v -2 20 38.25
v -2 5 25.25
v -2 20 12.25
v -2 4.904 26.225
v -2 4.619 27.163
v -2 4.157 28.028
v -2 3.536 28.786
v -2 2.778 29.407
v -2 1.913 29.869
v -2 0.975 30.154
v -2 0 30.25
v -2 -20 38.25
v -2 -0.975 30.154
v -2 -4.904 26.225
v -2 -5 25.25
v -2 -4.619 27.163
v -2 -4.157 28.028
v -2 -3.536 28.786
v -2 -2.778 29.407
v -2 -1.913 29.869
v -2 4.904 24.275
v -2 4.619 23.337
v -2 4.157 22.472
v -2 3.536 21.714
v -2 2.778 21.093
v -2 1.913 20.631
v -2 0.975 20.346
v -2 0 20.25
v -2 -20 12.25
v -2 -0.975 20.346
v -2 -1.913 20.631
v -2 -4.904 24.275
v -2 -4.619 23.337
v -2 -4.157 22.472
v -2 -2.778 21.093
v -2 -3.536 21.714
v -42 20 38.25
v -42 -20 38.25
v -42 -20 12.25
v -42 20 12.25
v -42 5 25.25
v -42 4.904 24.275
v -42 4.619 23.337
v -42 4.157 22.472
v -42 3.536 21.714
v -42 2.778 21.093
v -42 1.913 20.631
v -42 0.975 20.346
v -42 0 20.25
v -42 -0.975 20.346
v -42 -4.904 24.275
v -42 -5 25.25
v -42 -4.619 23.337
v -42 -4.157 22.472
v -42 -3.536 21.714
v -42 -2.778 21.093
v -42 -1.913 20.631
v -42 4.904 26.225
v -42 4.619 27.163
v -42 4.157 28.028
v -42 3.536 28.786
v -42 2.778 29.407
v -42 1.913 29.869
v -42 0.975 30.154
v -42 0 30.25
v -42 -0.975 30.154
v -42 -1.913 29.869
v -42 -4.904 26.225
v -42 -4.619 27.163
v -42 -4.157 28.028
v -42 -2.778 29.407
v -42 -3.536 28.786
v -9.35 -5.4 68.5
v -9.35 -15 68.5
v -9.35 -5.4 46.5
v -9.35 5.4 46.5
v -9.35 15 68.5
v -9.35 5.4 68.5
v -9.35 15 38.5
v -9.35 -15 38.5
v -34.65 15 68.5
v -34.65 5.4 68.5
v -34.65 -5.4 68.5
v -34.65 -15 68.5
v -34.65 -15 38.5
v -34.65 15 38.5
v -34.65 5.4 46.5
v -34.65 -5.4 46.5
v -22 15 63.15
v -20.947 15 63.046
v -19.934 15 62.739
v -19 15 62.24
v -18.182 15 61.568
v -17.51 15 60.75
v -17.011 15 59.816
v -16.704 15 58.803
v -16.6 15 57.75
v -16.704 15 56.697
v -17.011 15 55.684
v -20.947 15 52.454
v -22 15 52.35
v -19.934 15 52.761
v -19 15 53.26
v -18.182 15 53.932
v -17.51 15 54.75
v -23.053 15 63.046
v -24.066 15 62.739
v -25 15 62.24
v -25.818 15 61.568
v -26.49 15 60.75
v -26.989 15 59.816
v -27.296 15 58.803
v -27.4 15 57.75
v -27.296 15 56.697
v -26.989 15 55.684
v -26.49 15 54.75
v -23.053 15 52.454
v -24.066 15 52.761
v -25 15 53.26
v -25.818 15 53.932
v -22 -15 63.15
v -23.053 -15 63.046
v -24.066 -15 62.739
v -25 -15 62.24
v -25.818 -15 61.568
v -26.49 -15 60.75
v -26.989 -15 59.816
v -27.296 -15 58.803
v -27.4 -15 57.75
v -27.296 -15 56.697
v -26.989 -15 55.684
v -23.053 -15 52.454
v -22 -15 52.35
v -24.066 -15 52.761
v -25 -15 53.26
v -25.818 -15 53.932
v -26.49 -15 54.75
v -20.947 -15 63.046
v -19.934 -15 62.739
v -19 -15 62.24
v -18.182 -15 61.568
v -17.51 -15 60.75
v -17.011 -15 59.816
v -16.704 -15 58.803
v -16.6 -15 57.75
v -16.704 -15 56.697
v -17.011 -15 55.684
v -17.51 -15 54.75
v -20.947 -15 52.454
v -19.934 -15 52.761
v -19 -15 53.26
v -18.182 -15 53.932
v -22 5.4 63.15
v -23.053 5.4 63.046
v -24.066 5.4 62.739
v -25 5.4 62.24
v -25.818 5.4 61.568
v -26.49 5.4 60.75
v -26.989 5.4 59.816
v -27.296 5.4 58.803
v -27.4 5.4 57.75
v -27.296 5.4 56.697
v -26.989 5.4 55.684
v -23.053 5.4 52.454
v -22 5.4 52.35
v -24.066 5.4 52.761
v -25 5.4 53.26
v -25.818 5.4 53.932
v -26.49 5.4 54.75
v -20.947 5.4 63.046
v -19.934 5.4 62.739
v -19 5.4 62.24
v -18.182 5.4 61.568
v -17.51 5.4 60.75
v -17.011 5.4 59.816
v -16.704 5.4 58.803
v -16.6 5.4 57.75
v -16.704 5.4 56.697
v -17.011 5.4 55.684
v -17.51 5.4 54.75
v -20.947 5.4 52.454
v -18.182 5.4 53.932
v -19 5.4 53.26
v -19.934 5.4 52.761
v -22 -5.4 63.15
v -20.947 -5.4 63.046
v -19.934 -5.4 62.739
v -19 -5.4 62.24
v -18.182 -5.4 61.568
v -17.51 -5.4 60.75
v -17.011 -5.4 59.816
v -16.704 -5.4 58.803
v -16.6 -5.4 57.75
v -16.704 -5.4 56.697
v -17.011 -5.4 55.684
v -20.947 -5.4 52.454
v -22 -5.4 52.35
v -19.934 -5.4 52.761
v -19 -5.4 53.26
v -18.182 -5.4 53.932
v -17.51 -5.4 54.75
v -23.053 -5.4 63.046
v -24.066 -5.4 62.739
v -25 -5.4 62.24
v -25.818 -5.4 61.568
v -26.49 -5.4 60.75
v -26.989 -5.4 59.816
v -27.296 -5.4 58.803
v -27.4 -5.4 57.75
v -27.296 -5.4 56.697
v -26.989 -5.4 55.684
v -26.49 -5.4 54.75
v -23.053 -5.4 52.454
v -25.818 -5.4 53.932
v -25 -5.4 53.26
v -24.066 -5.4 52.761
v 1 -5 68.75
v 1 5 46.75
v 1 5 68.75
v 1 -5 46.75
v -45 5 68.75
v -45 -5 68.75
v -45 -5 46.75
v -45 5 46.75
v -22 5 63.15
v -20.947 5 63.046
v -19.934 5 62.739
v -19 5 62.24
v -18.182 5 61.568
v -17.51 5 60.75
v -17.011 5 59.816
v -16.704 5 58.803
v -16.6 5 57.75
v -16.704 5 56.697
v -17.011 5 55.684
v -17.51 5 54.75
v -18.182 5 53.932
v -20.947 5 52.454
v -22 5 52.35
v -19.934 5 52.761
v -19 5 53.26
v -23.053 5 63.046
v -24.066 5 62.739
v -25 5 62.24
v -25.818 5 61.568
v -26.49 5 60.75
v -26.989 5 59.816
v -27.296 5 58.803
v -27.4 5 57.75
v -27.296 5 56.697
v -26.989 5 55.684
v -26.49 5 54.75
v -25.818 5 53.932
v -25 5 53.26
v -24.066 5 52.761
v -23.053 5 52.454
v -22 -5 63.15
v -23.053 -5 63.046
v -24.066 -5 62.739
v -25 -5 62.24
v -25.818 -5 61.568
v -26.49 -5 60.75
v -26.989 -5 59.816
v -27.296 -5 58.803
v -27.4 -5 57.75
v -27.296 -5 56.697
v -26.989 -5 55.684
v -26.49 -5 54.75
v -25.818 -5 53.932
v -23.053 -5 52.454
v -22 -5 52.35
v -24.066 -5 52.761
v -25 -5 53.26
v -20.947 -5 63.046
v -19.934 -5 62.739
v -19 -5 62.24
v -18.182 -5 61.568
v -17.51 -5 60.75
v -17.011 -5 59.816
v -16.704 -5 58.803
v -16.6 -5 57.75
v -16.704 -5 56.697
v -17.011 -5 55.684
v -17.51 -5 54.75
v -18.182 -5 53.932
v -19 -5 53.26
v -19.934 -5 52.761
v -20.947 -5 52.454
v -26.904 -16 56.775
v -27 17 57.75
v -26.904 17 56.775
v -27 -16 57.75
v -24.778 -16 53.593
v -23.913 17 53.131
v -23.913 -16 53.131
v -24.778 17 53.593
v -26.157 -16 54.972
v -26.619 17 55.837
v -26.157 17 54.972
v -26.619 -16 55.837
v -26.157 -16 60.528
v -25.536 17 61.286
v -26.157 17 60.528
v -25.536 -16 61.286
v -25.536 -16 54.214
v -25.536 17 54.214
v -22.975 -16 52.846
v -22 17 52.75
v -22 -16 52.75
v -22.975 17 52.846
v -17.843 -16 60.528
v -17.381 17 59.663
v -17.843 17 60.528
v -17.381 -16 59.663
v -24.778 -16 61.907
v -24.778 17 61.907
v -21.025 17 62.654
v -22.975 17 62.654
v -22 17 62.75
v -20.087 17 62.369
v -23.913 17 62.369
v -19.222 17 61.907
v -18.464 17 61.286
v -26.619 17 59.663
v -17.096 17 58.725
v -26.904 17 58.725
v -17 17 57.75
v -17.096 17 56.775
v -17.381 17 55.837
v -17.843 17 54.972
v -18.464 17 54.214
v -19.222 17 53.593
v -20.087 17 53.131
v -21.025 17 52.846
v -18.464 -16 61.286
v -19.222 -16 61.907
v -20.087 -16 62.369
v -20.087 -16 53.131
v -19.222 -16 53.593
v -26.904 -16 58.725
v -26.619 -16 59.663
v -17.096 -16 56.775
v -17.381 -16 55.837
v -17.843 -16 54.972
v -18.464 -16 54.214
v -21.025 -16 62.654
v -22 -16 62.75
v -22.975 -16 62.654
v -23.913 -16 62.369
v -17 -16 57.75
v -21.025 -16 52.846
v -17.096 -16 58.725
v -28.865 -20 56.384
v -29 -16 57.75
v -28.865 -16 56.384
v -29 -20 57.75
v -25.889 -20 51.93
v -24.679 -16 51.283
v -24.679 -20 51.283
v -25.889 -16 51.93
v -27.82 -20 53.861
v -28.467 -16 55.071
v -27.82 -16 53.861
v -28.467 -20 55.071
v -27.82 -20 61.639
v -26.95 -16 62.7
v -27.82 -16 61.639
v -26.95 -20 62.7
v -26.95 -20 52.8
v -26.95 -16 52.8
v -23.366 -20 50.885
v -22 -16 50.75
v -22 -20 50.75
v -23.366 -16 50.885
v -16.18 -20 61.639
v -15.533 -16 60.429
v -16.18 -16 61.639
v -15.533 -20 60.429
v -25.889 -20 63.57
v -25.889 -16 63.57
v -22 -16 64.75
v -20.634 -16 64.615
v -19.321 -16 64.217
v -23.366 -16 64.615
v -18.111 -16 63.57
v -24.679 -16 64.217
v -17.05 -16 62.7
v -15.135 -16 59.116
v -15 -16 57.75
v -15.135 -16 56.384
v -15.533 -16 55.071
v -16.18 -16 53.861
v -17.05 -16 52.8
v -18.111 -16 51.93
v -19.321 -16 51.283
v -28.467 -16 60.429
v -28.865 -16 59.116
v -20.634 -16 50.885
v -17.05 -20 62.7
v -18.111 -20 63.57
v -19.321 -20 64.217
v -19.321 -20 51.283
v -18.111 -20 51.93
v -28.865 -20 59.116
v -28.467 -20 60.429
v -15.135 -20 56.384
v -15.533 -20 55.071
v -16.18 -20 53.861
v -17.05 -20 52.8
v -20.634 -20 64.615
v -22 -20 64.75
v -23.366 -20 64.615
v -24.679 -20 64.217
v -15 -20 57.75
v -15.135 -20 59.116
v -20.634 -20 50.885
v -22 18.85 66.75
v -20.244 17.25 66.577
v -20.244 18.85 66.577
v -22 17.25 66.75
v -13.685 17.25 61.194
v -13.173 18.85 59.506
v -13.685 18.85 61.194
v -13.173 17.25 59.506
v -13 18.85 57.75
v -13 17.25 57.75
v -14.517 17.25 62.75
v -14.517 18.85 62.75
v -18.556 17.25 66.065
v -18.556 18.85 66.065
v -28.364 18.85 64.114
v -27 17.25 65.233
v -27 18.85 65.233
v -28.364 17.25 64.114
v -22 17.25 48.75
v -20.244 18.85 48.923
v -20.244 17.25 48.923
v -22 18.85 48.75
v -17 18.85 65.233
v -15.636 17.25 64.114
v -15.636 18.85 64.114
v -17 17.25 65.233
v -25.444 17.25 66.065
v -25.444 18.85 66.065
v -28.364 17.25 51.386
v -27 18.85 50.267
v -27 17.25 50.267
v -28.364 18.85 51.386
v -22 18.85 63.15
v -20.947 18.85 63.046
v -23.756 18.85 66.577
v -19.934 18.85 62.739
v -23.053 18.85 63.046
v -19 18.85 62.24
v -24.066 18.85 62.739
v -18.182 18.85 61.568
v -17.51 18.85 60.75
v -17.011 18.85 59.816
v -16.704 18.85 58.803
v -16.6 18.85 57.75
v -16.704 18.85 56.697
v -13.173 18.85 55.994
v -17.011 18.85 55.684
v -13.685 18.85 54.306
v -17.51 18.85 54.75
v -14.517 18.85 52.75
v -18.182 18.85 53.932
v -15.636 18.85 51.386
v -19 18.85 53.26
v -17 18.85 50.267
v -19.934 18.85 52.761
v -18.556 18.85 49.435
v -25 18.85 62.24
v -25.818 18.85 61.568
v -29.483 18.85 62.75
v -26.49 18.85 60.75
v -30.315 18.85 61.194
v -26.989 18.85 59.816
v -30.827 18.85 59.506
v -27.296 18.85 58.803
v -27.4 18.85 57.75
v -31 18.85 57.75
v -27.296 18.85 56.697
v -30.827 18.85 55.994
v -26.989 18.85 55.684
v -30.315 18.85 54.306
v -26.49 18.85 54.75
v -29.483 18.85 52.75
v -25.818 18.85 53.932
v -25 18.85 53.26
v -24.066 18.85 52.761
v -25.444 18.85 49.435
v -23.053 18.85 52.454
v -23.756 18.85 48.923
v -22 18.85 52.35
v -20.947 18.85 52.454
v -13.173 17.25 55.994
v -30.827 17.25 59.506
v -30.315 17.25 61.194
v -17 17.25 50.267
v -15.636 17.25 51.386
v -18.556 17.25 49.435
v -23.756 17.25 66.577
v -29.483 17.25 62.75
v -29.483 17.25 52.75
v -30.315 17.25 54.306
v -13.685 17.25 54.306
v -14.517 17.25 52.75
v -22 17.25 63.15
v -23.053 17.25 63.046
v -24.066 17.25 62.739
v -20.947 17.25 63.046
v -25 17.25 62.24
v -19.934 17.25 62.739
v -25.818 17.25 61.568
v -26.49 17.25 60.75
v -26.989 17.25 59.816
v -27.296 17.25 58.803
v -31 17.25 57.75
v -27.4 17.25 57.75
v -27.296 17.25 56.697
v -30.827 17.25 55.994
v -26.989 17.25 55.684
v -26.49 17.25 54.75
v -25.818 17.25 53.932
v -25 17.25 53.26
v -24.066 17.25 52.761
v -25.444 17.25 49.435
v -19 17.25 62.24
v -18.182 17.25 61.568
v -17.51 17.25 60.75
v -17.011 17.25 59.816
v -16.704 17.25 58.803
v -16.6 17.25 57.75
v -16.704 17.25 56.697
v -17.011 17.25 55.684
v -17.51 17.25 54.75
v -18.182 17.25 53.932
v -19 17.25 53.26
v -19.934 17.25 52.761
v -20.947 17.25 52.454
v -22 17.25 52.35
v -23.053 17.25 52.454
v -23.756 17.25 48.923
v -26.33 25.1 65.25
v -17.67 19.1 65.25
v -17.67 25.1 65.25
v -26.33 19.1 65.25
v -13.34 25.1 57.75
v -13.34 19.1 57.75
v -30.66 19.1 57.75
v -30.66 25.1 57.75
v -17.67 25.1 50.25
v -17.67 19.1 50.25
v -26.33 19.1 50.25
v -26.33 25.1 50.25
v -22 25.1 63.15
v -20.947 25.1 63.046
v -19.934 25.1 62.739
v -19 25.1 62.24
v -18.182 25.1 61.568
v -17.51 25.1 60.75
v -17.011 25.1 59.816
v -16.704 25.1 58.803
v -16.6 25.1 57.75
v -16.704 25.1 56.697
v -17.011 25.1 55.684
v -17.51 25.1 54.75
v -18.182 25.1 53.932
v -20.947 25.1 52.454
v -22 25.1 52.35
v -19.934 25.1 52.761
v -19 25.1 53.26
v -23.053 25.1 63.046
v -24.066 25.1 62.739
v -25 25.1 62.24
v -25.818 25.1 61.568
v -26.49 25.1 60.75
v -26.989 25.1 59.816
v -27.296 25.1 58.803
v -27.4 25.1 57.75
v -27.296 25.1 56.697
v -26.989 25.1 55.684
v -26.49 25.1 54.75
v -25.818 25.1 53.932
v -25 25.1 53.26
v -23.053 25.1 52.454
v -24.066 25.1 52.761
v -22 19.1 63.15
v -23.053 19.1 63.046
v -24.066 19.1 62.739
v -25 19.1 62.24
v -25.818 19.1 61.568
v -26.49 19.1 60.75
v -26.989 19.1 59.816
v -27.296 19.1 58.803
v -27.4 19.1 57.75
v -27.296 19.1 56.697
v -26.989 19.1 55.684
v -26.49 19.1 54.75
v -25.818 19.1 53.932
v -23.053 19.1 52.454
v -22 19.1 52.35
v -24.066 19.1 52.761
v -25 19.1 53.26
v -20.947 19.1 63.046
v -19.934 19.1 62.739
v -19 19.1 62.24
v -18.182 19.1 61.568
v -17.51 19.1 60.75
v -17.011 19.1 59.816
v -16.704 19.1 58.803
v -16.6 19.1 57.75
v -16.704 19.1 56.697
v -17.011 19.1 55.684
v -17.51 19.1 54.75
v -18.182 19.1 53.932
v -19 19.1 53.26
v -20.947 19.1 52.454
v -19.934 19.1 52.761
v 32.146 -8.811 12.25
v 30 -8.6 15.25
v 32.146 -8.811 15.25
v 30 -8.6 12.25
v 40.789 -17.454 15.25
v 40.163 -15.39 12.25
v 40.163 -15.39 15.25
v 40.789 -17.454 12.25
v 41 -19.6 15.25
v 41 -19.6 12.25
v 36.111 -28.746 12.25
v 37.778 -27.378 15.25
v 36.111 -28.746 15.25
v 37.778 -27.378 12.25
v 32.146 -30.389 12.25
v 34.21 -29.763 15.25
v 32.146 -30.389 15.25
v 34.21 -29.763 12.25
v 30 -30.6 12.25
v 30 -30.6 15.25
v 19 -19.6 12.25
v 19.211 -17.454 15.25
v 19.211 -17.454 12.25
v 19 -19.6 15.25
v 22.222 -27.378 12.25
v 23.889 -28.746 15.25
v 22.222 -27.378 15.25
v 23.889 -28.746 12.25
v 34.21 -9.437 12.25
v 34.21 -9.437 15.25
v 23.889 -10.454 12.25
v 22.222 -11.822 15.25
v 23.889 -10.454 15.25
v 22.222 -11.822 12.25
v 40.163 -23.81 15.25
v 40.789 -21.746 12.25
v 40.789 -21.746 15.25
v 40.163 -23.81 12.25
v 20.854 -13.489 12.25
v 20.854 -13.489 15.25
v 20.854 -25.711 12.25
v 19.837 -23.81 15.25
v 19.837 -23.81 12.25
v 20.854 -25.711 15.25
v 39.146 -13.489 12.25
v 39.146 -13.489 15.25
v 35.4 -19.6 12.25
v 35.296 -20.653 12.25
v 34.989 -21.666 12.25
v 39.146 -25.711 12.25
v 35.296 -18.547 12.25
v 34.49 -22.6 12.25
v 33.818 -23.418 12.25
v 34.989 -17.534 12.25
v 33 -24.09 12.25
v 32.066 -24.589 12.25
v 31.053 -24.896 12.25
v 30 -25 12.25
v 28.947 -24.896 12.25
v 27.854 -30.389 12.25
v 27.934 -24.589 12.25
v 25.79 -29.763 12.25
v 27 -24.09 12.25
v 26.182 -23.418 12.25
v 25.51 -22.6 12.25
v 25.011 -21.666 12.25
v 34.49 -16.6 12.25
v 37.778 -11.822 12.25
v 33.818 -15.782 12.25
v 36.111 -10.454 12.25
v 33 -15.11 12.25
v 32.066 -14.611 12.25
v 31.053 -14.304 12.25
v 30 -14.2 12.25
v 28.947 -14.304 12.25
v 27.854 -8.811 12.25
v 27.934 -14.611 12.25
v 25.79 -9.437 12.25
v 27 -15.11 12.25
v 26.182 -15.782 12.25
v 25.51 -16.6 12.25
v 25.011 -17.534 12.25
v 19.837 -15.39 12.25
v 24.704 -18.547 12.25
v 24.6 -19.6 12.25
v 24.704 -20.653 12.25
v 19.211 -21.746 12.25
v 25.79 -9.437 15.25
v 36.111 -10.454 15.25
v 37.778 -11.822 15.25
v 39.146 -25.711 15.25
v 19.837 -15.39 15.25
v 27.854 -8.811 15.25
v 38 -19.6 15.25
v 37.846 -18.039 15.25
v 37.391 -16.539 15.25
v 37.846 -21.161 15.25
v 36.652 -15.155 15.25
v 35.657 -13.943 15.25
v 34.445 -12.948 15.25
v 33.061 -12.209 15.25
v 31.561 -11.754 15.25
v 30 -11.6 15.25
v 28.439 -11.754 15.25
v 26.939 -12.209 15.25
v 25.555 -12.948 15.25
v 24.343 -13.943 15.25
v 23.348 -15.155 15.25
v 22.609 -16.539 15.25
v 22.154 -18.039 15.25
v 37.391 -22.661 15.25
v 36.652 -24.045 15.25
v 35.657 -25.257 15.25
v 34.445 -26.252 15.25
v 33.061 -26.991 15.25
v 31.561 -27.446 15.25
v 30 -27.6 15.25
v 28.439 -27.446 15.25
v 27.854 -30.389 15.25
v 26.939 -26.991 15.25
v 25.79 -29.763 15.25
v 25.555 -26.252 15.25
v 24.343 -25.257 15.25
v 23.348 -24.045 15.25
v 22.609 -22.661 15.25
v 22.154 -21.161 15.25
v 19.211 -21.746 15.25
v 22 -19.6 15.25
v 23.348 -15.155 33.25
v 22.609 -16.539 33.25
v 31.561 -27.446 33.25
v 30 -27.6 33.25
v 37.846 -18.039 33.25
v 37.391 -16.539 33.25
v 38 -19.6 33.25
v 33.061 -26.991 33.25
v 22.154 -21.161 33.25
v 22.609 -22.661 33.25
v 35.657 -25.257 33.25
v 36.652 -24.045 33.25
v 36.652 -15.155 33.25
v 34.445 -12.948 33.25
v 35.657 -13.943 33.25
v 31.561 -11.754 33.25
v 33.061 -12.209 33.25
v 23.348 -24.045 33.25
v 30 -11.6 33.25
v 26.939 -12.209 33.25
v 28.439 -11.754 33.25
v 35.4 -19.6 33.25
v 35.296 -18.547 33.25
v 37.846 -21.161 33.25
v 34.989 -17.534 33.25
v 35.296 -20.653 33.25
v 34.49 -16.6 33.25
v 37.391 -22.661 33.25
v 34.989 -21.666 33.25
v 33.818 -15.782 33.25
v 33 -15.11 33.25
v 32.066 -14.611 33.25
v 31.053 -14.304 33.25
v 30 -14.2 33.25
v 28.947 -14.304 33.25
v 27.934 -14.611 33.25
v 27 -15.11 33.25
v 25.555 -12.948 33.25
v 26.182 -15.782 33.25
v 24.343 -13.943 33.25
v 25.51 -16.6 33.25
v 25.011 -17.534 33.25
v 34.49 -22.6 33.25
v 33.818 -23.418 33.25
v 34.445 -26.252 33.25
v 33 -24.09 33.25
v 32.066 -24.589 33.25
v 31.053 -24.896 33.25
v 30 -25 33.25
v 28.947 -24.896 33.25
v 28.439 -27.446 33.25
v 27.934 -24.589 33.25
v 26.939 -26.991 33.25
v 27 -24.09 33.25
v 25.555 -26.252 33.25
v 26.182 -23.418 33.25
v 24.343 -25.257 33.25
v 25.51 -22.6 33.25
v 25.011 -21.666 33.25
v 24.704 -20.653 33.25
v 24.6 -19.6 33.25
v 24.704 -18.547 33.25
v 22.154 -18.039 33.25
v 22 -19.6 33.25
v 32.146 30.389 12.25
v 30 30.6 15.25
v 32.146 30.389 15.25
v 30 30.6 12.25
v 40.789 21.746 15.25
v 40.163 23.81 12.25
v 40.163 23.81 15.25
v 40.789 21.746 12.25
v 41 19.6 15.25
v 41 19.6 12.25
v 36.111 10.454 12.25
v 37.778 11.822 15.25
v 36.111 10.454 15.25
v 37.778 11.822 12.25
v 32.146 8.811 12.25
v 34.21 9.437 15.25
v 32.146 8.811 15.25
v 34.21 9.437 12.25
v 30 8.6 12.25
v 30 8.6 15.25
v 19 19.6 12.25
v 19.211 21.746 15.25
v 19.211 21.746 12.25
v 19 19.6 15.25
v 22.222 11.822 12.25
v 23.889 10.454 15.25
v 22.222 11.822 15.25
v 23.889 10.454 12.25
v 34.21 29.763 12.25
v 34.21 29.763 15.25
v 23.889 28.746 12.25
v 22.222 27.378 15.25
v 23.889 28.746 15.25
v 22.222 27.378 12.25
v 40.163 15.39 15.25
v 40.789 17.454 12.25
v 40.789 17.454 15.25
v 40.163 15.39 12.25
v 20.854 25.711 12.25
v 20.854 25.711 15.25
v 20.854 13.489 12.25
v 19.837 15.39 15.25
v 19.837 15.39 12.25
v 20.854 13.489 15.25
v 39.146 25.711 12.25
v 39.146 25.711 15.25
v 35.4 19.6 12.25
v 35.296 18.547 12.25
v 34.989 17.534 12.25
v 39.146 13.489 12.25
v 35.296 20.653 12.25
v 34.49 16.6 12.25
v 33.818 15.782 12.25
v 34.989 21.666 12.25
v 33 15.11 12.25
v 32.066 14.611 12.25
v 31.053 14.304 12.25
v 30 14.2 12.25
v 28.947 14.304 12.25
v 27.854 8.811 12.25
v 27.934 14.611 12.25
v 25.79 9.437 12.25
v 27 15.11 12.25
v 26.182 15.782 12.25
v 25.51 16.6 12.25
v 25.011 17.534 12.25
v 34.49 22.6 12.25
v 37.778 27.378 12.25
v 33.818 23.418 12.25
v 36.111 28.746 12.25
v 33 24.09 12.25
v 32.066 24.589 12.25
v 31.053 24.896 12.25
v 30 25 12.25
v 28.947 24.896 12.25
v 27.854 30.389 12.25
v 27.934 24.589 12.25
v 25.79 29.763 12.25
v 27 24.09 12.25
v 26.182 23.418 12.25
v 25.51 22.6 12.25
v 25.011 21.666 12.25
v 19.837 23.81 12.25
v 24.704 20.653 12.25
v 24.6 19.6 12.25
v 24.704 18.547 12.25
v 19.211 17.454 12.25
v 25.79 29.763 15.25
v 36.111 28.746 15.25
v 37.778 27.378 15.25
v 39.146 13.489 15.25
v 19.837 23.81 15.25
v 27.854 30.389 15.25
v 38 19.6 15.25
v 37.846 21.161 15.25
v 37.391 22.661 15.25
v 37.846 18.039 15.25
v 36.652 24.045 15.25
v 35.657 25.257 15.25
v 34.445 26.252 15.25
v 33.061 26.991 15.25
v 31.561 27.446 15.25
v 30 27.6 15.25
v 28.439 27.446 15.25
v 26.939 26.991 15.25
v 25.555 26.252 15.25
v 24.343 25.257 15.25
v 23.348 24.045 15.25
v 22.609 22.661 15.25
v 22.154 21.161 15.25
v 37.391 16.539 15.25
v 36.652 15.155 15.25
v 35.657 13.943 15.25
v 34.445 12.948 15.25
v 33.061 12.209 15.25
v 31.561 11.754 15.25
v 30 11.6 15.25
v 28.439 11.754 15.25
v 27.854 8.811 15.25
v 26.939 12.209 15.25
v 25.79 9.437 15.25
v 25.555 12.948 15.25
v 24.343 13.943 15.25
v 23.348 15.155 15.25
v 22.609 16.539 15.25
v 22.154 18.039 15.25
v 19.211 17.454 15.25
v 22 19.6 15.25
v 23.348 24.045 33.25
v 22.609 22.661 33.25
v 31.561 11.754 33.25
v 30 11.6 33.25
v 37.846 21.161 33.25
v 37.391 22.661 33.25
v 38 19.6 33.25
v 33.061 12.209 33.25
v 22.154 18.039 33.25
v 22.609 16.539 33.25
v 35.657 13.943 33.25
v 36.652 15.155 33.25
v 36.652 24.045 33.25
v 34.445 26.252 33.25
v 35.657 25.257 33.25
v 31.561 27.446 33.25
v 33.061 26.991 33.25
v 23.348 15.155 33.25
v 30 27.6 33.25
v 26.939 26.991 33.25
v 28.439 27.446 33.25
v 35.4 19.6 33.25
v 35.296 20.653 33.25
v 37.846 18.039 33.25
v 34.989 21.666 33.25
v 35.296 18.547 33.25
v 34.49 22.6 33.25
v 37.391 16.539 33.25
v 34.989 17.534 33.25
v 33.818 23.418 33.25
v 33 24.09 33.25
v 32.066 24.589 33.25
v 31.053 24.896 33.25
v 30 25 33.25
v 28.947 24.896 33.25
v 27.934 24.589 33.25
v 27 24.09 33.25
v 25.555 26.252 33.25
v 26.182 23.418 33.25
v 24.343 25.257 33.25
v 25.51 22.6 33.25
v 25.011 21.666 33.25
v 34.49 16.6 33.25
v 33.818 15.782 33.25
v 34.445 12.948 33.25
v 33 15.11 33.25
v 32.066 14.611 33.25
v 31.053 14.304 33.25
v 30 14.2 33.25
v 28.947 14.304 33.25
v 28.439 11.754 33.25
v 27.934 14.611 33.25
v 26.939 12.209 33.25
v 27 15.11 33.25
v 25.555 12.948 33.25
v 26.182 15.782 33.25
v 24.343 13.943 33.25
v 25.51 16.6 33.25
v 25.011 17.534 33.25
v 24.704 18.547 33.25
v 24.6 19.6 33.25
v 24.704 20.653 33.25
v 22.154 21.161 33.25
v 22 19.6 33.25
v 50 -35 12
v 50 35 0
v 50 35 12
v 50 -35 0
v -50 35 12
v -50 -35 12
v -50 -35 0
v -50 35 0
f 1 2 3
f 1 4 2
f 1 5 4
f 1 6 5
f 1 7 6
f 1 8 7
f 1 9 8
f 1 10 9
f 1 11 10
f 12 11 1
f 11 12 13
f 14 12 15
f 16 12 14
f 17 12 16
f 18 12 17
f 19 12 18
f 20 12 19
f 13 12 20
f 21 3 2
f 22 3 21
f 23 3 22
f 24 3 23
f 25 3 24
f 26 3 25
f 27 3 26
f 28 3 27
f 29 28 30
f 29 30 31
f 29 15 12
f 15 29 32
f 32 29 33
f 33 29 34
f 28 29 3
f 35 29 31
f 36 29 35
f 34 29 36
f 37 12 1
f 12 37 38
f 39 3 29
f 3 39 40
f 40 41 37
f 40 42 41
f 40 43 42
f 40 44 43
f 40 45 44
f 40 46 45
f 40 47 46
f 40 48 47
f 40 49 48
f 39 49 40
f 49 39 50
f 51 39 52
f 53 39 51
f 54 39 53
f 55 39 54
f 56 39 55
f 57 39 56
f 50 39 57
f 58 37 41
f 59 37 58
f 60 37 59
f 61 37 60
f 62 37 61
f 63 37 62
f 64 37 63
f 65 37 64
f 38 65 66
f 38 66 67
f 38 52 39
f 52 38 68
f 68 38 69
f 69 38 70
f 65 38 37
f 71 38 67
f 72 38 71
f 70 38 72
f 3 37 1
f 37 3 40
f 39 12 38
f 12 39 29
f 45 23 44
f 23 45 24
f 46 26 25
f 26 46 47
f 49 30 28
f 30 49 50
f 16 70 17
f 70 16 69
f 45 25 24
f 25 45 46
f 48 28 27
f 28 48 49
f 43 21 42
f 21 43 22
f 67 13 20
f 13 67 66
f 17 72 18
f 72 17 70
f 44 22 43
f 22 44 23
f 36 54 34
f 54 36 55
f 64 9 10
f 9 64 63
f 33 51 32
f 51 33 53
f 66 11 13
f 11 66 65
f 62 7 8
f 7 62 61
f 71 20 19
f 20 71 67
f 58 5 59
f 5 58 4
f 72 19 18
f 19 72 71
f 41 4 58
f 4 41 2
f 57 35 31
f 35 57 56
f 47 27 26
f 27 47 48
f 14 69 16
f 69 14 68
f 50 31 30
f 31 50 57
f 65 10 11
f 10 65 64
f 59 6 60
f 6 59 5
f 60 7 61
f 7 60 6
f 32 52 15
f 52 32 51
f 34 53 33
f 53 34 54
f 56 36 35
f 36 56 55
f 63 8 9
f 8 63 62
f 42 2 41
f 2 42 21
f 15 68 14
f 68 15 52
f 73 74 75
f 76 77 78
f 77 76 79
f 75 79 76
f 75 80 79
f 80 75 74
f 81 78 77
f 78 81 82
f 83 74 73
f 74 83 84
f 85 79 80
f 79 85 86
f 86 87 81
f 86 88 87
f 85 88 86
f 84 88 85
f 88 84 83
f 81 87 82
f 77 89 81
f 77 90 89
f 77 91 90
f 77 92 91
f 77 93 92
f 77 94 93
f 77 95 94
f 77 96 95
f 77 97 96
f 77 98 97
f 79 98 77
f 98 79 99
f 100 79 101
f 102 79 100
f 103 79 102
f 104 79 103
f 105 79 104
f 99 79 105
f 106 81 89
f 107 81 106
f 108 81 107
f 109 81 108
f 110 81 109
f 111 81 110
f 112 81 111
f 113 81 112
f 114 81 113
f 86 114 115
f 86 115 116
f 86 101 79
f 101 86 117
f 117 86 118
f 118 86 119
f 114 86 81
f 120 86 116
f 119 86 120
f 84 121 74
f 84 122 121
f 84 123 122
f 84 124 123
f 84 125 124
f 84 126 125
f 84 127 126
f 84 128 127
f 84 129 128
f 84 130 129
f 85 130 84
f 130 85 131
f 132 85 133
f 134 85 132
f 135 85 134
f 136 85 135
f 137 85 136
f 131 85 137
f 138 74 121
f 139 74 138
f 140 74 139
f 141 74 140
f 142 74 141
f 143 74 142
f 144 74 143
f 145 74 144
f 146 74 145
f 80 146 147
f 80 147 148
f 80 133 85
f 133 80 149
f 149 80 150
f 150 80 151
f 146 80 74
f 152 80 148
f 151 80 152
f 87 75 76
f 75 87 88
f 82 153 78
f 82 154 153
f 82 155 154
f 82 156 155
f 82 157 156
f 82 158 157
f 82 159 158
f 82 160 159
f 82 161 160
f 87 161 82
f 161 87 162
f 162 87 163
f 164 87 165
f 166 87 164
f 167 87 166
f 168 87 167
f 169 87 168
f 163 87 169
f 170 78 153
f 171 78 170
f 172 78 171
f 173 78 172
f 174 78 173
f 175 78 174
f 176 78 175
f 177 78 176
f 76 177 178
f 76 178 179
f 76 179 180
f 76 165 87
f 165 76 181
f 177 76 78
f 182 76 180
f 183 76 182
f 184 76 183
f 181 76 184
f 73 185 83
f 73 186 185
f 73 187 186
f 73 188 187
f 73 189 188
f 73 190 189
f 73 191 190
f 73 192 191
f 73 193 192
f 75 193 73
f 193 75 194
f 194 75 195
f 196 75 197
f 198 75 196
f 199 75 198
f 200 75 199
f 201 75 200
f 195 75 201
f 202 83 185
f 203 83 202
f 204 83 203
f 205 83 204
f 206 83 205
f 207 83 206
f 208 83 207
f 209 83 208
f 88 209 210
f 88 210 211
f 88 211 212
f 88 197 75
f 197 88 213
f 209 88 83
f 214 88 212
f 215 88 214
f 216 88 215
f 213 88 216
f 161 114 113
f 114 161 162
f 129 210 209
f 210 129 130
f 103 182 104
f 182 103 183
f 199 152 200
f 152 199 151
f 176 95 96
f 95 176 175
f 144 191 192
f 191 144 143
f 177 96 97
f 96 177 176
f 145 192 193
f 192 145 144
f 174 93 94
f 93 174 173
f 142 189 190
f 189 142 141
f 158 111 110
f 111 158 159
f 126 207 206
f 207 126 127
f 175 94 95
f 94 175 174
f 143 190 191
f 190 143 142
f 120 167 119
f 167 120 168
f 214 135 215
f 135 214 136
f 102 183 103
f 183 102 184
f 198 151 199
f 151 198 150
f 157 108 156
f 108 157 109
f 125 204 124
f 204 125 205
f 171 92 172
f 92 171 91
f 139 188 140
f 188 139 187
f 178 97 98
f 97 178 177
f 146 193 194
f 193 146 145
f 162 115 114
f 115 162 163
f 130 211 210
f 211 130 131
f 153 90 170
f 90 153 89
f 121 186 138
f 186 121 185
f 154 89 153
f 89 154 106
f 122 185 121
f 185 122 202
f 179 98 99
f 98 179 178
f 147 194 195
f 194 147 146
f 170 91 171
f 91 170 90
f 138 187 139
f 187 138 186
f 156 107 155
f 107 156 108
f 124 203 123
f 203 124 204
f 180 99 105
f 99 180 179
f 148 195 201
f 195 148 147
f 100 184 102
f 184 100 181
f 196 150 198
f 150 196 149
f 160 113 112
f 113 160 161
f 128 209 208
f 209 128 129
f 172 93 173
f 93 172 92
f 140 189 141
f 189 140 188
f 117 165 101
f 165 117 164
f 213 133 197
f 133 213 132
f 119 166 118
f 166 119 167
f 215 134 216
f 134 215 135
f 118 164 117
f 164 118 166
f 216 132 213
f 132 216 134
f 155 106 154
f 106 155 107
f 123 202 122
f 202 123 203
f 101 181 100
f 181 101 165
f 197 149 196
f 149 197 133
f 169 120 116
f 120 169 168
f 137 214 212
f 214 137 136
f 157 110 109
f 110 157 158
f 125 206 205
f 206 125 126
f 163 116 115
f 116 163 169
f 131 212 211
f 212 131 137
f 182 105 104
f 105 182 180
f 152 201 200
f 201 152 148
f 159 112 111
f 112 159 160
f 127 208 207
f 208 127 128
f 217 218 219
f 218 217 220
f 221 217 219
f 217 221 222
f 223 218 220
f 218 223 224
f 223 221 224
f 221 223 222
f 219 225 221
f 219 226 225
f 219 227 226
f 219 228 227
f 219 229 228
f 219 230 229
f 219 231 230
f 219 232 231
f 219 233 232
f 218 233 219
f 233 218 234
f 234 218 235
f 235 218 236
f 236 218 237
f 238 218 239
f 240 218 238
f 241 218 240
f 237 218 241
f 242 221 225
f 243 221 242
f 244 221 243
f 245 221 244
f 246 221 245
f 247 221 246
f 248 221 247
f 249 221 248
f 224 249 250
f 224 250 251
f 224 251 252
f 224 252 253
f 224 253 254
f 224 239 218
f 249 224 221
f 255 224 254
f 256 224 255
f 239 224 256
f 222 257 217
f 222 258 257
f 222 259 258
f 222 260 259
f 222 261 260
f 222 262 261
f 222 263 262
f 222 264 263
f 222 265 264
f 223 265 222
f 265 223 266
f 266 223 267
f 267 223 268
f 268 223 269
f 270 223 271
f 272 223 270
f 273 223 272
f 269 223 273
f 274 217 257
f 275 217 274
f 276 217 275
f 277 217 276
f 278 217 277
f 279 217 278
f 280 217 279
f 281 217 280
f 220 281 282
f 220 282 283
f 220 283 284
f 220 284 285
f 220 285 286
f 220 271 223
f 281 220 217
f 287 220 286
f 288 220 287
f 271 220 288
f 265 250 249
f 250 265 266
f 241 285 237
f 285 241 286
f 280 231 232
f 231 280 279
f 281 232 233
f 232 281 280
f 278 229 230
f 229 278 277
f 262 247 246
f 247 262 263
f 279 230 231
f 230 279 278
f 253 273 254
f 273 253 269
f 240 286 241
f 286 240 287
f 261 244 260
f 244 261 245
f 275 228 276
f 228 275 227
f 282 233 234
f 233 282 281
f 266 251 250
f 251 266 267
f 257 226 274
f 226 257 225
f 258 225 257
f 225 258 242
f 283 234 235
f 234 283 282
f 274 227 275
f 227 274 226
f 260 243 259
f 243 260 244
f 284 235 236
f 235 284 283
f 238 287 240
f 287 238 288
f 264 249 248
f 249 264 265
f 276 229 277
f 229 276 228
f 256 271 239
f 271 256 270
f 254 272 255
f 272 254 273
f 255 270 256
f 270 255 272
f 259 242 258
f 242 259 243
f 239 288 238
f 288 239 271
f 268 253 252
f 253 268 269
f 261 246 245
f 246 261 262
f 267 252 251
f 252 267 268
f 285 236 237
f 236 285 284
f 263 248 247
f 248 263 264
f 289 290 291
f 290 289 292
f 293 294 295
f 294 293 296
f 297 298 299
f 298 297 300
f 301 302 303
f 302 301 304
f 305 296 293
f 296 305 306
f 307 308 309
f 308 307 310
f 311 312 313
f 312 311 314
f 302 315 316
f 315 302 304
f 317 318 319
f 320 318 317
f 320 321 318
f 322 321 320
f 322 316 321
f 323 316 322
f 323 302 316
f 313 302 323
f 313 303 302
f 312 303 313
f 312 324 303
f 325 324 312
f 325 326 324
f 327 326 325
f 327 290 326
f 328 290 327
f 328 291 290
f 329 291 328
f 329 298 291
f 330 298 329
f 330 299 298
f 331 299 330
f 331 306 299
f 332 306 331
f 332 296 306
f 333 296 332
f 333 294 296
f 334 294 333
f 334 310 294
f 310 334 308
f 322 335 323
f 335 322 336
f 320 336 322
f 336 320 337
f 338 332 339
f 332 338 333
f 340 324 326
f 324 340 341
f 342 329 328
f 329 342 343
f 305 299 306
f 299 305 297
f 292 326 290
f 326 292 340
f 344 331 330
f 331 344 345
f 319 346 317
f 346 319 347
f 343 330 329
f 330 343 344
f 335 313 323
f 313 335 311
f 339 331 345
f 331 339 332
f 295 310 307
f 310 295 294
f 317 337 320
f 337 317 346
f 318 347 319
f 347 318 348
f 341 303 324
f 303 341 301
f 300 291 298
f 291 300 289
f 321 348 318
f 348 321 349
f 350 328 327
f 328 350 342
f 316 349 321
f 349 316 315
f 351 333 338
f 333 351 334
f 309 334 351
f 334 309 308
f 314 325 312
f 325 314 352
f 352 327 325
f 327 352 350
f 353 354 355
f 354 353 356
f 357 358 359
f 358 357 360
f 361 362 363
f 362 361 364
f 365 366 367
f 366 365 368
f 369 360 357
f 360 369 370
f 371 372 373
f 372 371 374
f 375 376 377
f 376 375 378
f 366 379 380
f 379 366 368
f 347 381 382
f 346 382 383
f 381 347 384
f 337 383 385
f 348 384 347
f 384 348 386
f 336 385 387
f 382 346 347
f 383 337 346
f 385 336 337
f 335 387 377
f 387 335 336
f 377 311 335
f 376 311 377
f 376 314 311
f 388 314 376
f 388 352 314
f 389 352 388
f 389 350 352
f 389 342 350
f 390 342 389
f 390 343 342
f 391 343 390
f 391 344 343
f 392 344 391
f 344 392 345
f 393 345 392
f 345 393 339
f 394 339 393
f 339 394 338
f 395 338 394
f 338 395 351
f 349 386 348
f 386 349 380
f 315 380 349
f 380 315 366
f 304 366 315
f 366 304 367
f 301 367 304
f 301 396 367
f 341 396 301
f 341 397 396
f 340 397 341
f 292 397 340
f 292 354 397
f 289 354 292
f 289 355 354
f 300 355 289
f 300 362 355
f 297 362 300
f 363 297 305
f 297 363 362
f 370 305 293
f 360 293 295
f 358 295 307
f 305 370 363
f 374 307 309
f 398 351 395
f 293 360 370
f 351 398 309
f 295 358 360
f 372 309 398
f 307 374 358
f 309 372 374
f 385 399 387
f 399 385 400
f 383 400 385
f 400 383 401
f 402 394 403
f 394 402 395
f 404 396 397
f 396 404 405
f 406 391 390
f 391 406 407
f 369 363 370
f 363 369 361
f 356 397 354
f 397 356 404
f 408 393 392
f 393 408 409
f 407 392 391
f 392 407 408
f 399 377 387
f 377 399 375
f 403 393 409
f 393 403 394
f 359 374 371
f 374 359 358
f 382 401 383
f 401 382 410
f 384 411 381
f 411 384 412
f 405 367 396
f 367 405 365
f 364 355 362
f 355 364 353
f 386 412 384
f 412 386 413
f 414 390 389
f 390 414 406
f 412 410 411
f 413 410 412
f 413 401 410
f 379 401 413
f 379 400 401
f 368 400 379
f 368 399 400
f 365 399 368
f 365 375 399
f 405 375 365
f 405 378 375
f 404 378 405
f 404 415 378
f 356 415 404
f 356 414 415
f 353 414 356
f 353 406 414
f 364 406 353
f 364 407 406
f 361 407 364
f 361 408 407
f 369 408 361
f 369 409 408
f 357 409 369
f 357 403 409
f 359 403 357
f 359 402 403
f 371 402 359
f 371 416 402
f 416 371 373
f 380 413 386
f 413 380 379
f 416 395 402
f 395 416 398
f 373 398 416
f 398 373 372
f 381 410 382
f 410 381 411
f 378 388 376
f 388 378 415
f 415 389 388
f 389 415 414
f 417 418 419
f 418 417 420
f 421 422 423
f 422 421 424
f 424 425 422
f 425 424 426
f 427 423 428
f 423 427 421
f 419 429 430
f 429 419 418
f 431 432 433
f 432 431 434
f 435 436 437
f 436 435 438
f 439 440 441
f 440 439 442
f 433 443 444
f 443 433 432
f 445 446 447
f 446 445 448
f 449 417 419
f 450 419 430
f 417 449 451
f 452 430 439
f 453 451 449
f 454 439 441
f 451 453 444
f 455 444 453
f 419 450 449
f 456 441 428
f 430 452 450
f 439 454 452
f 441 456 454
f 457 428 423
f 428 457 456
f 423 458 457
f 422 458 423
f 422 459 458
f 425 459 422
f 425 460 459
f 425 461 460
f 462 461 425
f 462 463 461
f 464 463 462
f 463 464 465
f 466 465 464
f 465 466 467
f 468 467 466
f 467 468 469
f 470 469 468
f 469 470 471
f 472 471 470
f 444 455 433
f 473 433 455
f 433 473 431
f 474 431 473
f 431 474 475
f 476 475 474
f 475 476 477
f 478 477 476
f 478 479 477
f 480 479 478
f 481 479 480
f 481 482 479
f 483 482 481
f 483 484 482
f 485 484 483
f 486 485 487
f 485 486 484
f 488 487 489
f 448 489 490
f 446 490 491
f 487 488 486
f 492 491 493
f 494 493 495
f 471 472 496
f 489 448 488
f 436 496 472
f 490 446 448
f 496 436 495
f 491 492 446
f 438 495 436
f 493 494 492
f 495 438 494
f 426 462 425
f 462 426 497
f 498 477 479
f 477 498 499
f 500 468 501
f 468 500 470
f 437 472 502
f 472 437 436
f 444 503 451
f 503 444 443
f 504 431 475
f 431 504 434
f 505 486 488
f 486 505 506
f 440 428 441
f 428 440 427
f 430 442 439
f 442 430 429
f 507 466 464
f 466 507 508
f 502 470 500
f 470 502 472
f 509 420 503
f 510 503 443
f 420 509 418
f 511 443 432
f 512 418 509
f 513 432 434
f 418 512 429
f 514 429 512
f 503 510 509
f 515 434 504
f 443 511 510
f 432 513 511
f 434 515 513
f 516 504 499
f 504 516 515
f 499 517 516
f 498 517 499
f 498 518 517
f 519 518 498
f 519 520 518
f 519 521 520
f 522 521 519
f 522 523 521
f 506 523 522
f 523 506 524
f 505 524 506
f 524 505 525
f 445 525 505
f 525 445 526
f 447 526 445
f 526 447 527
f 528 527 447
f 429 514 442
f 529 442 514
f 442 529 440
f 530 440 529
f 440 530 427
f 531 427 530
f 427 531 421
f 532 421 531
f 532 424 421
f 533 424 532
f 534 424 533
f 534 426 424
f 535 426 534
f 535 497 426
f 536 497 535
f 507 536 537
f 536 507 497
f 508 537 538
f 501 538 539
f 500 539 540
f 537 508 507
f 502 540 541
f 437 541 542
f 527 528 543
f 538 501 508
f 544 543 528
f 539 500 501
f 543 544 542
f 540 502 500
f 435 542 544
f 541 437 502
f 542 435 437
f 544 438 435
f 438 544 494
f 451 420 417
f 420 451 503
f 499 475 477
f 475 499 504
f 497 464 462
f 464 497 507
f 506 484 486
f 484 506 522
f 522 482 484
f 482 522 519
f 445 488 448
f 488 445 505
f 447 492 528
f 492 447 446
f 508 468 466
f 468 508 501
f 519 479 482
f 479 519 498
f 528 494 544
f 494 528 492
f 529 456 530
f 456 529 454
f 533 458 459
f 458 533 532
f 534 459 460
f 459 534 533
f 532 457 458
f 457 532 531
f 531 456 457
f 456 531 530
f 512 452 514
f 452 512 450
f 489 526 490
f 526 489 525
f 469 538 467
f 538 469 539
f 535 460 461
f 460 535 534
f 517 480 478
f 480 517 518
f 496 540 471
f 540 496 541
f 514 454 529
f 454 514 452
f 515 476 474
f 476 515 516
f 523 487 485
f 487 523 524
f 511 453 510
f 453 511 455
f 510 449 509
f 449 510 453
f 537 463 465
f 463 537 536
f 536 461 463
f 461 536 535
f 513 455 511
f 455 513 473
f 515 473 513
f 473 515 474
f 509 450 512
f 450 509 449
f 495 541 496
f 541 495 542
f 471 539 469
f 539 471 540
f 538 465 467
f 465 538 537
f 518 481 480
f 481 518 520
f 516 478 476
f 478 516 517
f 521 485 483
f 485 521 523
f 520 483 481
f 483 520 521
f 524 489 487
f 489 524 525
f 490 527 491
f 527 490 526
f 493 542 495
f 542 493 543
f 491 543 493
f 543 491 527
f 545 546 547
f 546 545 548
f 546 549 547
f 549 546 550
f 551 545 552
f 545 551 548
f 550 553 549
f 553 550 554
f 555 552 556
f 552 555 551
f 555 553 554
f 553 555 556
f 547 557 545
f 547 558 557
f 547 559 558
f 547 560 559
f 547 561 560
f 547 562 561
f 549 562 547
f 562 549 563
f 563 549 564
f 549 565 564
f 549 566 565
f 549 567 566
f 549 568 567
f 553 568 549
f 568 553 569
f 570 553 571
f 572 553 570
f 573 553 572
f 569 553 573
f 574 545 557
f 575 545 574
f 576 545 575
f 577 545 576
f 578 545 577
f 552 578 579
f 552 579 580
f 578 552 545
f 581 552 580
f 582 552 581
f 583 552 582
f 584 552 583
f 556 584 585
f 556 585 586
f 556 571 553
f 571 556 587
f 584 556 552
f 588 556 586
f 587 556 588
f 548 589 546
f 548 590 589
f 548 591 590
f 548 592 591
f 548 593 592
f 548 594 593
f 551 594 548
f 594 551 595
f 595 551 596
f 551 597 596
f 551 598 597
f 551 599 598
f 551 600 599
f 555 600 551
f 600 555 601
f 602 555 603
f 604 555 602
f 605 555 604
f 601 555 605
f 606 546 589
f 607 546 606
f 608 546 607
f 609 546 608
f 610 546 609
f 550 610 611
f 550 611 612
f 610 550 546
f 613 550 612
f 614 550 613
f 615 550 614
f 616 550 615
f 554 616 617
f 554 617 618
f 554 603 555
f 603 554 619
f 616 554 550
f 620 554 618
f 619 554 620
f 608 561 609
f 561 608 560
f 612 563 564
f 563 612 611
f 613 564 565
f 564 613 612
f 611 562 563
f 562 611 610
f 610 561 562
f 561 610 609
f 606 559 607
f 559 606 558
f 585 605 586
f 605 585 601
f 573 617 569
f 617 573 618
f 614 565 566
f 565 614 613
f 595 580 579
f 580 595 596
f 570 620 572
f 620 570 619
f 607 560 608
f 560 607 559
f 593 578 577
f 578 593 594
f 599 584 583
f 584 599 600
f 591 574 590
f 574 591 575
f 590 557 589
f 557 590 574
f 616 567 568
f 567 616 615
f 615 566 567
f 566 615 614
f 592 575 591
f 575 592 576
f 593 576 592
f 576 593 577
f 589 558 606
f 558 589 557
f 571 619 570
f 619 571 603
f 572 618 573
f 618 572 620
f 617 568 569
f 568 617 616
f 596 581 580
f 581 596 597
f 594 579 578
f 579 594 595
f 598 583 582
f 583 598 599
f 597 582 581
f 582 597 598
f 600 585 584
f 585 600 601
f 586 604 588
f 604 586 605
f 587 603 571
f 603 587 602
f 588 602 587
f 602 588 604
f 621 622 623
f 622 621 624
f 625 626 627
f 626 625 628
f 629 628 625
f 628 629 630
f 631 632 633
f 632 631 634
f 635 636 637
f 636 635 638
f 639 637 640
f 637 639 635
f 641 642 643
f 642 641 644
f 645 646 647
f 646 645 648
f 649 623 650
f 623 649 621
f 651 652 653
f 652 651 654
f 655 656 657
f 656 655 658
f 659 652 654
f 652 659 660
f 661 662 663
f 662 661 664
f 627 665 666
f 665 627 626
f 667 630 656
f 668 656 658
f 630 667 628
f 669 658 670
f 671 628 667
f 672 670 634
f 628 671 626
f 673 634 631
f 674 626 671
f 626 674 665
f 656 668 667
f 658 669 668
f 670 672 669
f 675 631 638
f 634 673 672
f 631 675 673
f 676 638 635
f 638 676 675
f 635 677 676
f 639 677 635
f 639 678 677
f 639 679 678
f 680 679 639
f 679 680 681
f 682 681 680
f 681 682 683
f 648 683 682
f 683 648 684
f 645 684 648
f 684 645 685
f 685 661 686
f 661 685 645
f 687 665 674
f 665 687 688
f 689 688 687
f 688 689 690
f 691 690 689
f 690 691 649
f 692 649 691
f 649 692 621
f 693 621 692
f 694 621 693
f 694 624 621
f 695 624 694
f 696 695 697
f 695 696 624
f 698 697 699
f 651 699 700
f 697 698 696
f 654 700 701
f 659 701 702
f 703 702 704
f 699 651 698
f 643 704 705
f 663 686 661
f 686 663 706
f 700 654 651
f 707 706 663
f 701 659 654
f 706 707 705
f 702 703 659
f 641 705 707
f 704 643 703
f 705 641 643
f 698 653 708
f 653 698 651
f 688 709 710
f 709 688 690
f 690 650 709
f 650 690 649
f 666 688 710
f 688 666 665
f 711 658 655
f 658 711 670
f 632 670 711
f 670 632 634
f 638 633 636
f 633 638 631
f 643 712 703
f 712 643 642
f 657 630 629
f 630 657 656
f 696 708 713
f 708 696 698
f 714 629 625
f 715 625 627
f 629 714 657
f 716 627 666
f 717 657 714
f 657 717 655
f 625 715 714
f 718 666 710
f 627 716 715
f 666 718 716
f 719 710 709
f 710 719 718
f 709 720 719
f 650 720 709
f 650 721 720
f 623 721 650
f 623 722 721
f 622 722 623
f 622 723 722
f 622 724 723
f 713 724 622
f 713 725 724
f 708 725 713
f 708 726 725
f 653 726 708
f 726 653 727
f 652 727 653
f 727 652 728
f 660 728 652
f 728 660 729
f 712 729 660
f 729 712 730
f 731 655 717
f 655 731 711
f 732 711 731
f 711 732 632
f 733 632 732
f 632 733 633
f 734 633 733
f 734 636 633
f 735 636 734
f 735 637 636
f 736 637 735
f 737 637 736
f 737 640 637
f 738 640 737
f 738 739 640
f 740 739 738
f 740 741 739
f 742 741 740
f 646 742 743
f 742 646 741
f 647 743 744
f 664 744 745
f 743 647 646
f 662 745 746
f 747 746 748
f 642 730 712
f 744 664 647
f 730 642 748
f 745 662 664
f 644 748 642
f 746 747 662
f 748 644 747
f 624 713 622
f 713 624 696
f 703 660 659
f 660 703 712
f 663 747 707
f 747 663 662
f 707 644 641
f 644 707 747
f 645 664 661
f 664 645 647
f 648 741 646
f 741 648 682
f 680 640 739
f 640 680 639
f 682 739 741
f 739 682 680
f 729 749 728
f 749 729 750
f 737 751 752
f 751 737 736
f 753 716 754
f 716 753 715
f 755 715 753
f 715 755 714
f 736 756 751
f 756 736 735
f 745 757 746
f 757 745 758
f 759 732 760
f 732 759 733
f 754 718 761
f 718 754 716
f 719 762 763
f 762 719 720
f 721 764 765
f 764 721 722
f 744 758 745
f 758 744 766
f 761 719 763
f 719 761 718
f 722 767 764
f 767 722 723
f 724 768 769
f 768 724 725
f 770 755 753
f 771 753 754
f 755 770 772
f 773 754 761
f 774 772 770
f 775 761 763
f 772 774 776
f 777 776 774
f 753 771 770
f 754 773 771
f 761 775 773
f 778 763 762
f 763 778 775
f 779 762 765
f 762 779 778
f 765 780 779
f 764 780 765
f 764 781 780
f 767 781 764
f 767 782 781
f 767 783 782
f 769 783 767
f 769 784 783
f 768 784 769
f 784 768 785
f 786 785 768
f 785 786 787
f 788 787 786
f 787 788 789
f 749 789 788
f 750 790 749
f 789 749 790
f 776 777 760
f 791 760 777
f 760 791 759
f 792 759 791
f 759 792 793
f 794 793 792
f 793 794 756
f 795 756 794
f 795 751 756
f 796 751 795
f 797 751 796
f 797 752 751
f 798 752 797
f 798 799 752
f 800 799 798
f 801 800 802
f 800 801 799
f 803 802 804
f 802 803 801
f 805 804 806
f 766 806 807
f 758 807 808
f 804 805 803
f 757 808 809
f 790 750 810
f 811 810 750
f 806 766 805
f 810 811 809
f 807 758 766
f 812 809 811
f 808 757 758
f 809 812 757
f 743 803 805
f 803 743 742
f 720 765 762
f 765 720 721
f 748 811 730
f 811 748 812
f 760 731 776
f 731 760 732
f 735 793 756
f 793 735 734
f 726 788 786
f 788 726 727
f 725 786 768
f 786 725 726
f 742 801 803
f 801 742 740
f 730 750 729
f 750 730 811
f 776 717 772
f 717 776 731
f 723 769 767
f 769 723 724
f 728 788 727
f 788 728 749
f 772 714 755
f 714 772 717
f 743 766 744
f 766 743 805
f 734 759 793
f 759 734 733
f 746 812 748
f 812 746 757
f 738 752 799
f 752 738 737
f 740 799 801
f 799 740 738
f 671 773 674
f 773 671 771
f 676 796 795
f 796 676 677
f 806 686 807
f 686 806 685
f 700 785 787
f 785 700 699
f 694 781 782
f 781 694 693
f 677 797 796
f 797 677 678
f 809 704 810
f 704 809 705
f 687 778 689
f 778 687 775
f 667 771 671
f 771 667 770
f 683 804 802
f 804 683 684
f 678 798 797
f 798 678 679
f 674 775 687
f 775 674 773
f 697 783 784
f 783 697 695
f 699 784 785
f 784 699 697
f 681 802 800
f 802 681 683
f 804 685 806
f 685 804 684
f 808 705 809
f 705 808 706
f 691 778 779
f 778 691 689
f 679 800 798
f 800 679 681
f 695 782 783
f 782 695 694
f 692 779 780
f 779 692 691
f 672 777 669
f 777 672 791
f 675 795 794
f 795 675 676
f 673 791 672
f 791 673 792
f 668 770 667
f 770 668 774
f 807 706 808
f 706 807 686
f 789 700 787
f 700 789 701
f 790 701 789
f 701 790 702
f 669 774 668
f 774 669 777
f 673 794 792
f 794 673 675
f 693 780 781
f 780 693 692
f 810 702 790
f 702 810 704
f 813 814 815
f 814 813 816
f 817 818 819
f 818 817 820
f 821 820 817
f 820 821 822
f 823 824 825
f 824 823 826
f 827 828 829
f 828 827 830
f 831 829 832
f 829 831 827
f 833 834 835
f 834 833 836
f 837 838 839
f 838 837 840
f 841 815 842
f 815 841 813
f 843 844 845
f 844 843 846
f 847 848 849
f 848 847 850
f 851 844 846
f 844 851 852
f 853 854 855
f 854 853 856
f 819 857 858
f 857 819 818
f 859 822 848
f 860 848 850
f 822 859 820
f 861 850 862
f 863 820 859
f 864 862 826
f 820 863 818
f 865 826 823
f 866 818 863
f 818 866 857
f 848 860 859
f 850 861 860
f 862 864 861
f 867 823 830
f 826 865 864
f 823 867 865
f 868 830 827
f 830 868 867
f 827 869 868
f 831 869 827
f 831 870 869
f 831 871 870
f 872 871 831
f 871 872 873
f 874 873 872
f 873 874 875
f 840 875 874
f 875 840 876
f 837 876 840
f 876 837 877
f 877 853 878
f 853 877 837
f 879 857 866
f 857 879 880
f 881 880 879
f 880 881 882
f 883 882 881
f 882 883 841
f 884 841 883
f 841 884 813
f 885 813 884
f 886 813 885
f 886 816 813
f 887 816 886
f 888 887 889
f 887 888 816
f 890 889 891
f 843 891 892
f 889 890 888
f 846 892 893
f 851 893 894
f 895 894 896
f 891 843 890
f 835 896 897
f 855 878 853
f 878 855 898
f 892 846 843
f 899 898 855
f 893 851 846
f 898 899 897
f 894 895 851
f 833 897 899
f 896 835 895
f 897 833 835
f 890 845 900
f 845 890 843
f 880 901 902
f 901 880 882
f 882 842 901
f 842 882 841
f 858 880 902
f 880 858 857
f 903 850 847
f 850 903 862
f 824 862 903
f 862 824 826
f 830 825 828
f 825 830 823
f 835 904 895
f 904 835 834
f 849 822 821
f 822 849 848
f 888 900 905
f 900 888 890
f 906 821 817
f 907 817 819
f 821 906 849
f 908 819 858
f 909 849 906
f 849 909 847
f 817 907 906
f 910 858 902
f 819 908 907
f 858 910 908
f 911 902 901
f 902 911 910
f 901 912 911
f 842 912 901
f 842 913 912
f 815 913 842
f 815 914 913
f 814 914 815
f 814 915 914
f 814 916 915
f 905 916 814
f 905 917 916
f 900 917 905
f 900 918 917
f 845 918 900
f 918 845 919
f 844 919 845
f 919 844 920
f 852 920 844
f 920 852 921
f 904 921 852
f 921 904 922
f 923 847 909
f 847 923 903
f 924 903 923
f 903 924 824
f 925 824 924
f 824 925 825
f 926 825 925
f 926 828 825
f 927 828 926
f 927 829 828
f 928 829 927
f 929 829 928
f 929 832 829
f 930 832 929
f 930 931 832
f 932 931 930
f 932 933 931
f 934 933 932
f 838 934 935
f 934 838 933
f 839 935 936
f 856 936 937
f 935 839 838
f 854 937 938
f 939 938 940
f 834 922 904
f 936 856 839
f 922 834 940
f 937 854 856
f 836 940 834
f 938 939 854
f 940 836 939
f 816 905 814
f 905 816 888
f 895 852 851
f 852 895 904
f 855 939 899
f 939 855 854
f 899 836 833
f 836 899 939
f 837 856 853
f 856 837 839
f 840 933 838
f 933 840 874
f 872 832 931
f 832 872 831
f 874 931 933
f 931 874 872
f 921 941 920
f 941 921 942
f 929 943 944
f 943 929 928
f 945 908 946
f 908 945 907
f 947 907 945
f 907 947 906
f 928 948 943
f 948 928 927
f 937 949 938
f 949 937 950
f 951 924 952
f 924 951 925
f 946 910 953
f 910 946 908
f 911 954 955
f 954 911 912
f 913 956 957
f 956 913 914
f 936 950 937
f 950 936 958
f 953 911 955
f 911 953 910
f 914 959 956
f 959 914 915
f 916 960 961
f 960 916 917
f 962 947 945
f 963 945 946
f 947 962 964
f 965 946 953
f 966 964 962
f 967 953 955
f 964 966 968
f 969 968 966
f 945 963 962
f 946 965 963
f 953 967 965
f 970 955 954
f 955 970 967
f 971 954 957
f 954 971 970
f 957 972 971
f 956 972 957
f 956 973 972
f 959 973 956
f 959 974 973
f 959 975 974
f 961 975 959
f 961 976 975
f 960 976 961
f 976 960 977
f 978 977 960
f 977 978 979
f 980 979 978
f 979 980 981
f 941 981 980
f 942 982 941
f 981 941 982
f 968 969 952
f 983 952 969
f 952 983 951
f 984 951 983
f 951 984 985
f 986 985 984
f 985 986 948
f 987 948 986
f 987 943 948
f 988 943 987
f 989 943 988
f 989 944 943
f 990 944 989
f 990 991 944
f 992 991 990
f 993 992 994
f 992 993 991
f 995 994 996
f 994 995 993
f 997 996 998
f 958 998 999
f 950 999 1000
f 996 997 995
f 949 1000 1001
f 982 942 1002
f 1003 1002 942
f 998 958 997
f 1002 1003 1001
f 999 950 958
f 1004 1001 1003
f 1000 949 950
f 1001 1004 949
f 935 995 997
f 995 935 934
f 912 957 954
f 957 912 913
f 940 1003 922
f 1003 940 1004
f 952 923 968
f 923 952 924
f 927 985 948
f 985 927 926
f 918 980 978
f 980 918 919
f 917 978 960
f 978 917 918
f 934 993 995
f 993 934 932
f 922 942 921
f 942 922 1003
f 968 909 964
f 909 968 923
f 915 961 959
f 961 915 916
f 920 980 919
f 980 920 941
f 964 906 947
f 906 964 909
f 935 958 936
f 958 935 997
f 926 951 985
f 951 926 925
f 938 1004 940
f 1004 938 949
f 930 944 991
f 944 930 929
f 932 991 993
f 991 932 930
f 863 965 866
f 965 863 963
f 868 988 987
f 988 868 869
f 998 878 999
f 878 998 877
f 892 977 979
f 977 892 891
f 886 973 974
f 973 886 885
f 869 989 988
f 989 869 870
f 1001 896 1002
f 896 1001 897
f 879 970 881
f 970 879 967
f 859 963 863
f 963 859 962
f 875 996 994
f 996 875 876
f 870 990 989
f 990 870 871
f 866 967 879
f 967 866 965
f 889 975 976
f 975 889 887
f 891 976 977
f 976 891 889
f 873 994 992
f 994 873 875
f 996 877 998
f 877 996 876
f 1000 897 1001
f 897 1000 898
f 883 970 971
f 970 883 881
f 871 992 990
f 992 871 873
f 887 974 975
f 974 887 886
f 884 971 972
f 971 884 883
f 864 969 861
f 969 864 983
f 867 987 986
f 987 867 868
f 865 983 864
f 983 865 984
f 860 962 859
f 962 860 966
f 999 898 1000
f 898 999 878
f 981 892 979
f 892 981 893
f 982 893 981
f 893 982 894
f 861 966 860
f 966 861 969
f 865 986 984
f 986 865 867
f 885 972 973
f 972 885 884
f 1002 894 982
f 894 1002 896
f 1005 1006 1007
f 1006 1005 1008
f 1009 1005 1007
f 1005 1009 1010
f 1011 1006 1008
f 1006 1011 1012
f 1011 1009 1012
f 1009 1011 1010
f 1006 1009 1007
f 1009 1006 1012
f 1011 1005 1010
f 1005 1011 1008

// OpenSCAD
$fn = 32;

// ------------------------------------------------------------------------
// Indexing jig: plate 100 x 70 mm, pin d10
// Every part is its own module, assembly() places every instance.
// ------------------------------------------------------------------------

// --- part 1 ---
module jig_plate() {
  difference() {
    translate([-50, -35, 0]) cube([100, 70, 12]);
  }
}

// --- part 2 ---
module locator_block() {
  difference() {
    translate([-20, -20, 0]) cube([40, 40, 26]);
    translate([0, 0, 13]) rotate([0, 90, 0]) cylinder(h = 42, d = 10, center = true);
  }
}

// --- part 3 ---
module index_fork() {
  difference() {
    translate([-12.65, -15, 0]) cube([25.3, 30, 30]);
    translate([-13.65, -5.4, 8]) cube([27.3, 10.8, 23]);
    translate([0, 0, 19.25]) rotate([90, 0, 0]) cylinder(h = 32, d = 10.8, center = true);
  }
}

// --- part 4 ---
module index_arm() {
  difference() {
    translate([-23, -5, 0]) cube([46, 10, 22]);
    translate([0, 0, 11]) rotate([90, 0, 0]) cylinder(h = 12, d = 10.8, center = true);
  }
}

// --- part 5 ---
module index_pin() {
  rotate([0, 90, 0]) cylinder(h = 34, d = 10, center = true);
  translate([-20, 0, 0]) rotate([0, 90, 0]) cylinder(h = 4, d = 14);
}

// --- part 6 ---
module pin_washer() {
  difference() {
      translate([0, 0, 0]) cylinder(h = 1.6, d = 18);
      translate([0, 0, -1]) cylinder(h = 3.6, d = 10.8);
    }
}

// --- part 7 ---
module lock_nut() {
  difference() {
    linear_extrude(height = 6) polygon(points = [[8.66, 0], [4.33, 7.5], [-4.33, 7.5], [-8.66, 0], [-4.33, -7.5], [4.33, -7.5]]);
    translate([0, 0, -1]) cylinder(h = 8, d = 10.8);
  }
}

// --- part 8 ---
module guide_bush_a() {
  difference() {
    union() {
      cylinder(h = 3, d = 22);
      translate([0, 0, 3]) cylinder(h = 18, d = 16);
    }
    translate([0, 0, -1]) cylinder(h = 23, d = 10.8);
  }
}

// --- part 9 ---
module guide_bush_b() {
  difference() {
    union() {
      cylinder(h = 3, d = 22);
      translate([0, 0, 3]) cylinder(h = 18, d = 16);
    }
    translate([0, 0, -1]) cylinder(h = 23, d = 10.8);
  }
}

// --- assembly ---
module assembly() {
  color([0.80, 0.24, 0.20]) translate([0, 0, 0]) rotate([0, 0, 0]) jig_plate();
  color([0.20, 0.45, 0.75]) translate([-22, 0, 12.25]) rotate([0, 0, 0]) locator_block();
  color([0.25, 0.62, 0.32]) translate([-22, 0, 38.5]) rotate([0, 0, 0]) index_fork();
  color([0.92, 0.70, 0.18]) translate([-22, 0, 46.75]) rotate([0, 0, 0]) index_arm();
  color([0.58, 0.35, 0.70]) translate([-22, 0, 57.75]) rotate([0, 0, 90]) index_pin();
  color([0.16, 0.66, 0.66]) translate([-22, 18.85, 57.75]) rotate([90, 0, 0]) pin_washer();
  color([0.85, 0.48, 0.18]) translate([-22, 25.1, 57.75]) rotate([90, 0, 0]) lock_nut();
  color([0.55, 0.60, 0.65]) translate([30, -19.6, 12.25]) rotate([0, 0, 0]) guide_bush_a();
  color([0.75, 0.30, 0.55]) translate([30, 19.6, 12.25]) rotate([0, 0, 0]) guide_bush_b();
}

assembly();
